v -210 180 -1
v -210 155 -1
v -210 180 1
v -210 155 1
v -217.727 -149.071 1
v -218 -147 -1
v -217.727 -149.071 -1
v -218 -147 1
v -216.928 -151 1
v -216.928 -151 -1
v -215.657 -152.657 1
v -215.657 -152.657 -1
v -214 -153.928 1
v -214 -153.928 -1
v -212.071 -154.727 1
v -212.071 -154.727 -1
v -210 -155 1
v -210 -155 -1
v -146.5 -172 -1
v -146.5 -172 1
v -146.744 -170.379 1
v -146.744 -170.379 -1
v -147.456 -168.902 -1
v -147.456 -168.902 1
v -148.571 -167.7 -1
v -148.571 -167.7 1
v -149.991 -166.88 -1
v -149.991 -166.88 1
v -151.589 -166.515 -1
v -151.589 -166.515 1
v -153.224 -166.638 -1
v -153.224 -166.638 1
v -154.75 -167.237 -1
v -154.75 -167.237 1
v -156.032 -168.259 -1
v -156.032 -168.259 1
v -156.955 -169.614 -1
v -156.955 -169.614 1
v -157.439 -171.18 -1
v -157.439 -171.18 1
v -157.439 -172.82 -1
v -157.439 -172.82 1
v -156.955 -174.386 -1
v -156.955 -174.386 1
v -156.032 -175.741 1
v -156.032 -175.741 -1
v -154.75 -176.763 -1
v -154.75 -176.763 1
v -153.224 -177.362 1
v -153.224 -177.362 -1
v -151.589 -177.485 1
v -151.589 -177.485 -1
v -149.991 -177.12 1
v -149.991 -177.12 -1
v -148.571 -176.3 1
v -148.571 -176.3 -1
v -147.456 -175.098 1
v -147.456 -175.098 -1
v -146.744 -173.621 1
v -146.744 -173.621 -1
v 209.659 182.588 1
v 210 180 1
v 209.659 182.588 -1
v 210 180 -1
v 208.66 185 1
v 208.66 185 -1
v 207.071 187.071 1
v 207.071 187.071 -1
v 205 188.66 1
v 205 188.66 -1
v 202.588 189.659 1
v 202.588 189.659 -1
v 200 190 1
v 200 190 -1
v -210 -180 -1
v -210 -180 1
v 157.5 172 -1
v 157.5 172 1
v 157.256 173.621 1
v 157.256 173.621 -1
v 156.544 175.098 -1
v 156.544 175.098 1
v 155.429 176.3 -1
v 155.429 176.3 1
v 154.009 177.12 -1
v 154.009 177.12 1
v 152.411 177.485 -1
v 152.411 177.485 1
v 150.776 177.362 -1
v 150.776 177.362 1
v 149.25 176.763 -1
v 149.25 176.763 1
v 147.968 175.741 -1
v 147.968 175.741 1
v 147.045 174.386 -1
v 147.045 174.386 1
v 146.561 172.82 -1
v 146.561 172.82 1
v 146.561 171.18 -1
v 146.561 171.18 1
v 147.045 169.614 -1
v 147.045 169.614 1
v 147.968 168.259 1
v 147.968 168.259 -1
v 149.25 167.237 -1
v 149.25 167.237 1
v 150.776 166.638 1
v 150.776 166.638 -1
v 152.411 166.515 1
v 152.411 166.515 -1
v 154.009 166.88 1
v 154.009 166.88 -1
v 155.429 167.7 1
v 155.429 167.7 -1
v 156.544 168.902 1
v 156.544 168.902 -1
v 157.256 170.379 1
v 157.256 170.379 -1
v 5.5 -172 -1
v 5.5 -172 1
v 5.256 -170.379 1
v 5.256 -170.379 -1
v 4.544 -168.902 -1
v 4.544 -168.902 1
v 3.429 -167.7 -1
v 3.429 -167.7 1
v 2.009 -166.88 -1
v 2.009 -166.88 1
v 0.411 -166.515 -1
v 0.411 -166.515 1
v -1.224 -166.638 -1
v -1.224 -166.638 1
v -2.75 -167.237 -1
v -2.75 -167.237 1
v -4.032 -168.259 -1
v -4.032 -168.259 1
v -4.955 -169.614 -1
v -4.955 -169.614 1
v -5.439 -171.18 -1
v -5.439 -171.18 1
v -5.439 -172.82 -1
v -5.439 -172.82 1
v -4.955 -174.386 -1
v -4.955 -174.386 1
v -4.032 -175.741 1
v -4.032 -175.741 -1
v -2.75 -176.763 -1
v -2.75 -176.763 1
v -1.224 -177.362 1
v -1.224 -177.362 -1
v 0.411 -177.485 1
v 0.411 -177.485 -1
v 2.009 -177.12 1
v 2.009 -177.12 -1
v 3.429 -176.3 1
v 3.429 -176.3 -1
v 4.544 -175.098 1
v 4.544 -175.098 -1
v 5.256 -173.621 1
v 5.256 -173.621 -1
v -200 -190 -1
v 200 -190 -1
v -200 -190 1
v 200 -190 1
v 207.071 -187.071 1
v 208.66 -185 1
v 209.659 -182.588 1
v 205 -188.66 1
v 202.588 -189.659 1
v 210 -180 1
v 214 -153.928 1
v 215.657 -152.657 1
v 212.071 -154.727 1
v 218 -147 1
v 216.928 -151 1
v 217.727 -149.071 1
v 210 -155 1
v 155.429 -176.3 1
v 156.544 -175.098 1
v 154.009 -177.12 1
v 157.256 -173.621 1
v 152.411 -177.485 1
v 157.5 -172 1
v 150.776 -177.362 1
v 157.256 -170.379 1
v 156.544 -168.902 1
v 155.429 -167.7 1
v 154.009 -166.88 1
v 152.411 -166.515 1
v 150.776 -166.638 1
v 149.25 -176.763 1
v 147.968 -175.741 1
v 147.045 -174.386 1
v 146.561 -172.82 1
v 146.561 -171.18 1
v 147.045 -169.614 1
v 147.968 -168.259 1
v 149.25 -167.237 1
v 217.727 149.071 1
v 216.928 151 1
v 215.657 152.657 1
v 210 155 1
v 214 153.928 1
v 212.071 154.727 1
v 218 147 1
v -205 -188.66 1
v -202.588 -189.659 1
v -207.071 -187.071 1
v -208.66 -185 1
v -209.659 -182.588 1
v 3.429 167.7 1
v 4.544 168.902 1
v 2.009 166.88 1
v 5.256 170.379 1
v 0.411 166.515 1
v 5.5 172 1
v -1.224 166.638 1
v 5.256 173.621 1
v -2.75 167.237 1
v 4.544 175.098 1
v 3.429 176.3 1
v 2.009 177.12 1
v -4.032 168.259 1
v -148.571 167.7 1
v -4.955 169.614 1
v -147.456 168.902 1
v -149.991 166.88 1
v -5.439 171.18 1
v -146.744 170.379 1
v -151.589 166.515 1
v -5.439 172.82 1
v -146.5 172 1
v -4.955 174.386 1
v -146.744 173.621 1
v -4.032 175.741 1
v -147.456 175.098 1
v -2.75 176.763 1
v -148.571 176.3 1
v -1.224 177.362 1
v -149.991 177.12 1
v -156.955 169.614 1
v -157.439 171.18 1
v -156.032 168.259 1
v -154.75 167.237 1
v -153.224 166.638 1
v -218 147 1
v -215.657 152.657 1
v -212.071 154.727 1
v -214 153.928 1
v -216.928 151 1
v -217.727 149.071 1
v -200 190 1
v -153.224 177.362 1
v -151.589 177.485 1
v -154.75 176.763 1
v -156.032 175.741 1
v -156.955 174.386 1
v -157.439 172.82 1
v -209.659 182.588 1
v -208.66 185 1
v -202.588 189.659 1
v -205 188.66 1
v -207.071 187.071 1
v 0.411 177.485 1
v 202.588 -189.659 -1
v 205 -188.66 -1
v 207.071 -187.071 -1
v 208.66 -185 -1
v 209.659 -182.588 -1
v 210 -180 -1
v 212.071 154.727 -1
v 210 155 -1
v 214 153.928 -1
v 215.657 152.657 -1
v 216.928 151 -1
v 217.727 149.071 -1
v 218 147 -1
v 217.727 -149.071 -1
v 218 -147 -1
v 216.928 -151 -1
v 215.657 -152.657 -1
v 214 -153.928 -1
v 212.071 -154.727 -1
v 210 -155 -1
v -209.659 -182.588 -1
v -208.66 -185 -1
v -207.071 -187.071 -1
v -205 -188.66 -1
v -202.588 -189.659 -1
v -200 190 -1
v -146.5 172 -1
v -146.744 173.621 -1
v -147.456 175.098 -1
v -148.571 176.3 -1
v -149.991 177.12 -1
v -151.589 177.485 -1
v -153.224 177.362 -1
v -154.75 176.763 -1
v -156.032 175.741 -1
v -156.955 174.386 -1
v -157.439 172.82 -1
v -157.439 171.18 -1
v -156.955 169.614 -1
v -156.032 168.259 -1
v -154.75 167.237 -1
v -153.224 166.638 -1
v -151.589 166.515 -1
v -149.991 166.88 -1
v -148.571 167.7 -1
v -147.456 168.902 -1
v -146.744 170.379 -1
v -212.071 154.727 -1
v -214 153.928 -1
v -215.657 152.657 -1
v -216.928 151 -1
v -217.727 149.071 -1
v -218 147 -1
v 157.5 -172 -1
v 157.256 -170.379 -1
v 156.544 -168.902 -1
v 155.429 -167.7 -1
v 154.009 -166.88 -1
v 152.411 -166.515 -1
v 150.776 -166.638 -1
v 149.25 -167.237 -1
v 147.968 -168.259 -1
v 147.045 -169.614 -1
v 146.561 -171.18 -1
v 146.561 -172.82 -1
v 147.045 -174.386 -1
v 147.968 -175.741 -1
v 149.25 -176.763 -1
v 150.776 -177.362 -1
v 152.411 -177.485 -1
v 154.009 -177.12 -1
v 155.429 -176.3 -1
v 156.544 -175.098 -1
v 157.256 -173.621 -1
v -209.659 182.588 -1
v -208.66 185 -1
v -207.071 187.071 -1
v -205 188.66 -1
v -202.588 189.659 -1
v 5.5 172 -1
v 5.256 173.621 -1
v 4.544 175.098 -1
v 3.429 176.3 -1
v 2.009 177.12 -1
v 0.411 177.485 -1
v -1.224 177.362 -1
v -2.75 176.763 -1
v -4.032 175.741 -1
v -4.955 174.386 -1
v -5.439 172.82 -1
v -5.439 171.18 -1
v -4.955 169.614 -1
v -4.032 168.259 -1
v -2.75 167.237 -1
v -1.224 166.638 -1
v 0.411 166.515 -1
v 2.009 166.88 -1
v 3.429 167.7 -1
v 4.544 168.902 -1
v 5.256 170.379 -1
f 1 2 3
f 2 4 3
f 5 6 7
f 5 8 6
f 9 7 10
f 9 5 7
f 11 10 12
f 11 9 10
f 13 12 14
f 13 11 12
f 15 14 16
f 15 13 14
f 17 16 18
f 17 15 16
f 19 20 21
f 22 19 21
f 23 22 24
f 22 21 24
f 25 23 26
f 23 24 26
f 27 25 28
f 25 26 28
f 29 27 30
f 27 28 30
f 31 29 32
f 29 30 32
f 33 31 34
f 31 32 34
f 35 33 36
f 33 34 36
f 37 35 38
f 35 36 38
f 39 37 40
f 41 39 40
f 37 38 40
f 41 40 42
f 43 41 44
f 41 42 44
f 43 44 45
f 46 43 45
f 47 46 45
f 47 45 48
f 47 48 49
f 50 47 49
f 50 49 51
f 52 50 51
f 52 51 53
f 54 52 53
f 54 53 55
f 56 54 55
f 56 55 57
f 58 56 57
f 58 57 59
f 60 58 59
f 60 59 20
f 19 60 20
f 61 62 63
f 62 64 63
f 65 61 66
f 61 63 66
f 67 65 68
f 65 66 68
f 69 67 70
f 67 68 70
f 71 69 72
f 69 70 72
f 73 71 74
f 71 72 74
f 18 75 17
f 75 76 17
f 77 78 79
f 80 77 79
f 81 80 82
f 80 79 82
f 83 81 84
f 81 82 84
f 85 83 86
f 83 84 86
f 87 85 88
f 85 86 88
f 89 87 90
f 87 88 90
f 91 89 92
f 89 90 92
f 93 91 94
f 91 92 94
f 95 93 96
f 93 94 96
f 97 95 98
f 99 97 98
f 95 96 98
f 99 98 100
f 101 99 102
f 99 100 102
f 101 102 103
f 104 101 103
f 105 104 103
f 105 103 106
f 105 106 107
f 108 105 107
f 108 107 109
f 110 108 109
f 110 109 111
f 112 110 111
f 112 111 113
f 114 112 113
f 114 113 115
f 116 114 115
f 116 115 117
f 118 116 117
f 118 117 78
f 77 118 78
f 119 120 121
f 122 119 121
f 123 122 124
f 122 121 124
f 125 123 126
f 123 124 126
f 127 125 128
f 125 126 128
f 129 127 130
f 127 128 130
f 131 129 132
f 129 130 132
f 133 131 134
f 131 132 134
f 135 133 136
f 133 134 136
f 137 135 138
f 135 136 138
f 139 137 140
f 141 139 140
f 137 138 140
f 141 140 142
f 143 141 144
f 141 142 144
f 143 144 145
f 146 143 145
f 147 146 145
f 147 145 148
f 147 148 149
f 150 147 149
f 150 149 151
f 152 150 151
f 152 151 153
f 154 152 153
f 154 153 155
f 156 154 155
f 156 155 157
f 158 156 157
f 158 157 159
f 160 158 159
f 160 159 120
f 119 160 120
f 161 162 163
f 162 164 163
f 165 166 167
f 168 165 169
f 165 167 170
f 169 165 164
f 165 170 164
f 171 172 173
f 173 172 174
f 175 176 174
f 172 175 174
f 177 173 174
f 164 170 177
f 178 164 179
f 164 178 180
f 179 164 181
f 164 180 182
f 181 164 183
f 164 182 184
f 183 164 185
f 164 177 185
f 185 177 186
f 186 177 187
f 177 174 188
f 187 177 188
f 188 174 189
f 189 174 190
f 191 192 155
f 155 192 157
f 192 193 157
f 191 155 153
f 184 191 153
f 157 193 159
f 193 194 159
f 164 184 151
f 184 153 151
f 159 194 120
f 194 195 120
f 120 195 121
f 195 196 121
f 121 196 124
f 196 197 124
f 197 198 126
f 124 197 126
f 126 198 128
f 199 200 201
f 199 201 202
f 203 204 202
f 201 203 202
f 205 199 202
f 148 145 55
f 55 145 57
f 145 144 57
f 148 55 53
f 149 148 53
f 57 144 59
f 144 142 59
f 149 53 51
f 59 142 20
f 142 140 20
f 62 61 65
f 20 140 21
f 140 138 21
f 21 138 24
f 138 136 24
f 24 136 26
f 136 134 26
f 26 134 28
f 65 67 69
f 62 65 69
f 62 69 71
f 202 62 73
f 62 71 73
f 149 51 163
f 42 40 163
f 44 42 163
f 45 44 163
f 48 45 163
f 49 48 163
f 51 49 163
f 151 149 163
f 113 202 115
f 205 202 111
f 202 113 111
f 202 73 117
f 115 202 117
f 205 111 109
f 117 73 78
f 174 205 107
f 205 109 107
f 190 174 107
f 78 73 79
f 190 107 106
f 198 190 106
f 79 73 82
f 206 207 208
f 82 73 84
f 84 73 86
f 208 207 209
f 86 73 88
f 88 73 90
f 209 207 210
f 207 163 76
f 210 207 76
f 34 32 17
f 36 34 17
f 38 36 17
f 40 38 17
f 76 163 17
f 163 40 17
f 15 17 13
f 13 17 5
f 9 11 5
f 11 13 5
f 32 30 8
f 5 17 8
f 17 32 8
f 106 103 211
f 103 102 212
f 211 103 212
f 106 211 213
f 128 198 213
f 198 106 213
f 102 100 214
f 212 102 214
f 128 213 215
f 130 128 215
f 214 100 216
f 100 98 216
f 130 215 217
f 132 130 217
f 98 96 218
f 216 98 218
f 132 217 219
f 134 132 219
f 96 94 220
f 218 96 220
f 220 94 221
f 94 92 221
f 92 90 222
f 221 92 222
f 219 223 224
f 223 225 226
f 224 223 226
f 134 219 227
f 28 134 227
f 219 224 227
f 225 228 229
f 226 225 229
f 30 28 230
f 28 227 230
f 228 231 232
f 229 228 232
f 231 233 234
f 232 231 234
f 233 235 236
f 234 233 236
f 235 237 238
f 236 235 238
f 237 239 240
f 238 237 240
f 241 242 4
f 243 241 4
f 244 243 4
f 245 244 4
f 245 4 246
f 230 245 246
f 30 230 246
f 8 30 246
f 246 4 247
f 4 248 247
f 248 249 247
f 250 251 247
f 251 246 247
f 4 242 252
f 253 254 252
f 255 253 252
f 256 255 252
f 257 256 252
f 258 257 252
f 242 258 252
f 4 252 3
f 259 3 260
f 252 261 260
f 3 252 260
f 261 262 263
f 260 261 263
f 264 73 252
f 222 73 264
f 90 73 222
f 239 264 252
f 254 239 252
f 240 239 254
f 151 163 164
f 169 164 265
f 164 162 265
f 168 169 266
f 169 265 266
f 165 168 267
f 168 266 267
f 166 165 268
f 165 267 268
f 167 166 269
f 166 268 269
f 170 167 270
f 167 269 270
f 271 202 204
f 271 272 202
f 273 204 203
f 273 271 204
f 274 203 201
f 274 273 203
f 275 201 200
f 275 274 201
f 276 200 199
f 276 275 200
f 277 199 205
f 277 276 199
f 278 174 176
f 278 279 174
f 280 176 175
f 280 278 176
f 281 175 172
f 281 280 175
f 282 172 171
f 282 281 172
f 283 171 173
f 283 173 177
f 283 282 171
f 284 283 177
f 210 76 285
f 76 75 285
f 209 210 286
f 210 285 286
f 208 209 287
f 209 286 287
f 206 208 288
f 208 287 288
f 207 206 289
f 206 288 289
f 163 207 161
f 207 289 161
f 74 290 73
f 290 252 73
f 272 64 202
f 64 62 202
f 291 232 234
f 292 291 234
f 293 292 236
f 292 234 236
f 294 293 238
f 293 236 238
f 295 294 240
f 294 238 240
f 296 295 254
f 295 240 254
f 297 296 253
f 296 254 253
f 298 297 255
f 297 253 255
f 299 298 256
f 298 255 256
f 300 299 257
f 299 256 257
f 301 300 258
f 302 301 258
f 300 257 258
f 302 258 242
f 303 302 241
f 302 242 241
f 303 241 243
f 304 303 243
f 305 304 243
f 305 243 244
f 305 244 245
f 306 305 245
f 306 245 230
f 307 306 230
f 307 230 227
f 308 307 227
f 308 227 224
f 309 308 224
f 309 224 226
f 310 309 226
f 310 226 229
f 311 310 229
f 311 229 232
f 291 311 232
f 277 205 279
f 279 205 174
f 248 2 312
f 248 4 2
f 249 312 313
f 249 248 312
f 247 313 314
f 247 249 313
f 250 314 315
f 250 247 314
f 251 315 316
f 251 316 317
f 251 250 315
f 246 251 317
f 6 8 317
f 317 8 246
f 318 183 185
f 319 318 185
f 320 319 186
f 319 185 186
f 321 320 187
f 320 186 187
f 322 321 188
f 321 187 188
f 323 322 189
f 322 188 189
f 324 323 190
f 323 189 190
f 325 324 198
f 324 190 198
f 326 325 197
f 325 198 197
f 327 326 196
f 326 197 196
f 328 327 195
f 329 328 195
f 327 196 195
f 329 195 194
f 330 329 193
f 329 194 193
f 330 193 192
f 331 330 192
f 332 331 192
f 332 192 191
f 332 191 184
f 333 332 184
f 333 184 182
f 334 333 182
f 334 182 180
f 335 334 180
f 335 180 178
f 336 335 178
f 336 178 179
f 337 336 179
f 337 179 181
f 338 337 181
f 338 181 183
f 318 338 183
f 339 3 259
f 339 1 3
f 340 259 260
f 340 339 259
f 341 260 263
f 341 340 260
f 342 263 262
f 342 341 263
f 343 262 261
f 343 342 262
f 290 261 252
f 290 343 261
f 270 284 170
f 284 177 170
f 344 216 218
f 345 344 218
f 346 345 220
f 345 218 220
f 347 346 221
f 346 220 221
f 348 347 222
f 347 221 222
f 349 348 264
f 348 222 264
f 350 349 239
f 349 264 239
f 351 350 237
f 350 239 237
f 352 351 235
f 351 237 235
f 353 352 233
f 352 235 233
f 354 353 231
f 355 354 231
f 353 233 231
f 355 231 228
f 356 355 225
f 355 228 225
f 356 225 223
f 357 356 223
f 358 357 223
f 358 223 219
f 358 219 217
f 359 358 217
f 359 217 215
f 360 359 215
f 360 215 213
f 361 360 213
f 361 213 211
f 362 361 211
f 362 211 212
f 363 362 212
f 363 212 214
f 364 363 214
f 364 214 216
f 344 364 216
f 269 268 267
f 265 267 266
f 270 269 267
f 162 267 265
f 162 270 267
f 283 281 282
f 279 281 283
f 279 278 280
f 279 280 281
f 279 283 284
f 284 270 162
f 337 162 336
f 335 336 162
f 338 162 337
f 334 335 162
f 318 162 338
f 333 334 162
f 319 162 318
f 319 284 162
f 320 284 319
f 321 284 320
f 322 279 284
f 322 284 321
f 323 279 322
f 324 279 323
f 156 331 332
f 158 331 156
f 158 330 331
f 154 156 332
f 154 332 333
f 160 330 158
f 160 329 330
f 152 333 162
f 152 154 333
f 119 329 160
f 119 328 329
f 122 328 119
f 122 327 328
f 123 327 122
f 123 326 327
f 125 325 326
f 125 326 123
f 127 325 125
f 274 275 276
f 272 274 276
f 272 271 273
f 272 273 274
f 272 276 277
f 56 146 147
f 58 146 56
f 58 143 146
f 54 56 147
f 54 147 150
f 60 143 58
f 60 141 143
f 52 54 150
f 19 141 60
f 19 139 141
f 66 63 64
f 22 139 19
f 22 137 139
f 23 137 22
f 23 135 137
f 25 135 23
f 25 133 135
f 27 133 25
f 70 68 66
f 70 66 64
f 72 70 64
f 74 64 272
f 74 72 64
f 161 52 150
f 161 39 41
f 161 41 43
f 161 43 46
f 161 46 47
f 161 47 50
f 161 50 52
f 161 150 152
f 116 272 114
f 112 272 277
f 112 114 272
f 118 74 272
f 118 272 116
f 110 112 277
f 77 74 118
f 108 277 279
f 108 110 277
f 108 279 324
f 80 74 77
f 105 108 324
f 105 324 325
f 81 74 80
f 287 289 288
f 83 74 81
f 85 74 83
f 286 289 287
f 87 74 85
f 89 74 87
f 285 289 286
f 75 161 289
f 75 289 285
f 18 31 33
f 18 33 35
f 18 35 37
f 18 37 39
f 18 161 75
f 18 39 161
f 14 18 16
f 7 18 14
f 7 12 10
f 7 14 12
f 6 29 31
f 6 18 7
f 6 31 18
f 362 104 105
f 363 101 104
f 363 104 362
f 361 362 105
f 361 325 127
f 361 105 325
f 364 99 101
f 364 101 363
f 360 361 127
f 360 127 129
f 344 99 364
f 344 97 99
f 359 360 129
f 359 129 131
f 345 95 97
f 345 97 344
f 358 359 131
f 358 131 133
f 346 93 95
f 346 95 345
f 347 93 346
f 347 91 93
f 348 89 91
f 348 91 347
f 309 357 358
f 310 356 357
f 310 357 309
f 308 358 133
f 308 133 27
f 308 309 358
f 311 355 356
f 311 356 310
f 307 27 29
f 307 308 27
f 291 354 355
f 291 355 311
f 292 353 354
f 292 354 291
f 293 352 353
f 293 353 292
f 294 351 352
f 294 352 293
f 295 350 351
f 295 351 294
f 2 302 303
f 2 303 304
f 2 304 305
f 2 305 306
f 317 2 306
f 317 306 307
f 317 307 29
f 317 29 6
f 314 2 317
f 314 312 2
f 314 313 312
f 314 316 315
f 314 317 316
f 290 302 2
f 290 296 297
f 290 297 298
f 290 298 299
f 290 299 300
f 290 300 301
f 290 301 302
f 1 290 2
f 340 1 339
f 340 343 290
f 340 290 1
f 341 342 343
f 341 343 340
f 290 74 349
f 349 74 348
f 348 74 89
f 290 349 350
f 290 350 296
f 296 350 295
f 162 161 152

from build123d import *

# Parameters (mm, degrees)
EXTRUDE_1_DEPTH     = 1
FILLET_1_R          = 10
FILLET_2_R          = 8
SKETCH_2_R          = 5.5
CUT_EXTRUDE_1_DEPTH = 10


with BuildPart() as part:
    # Эскиз1 → Бобышка-Вытянуть1 (new, symmetric)
    with BuildSketch(Plane.XY):
        Polygon((-210, 155), (-210, 190), (210, 190), (210, 155), (218, 155), (218, -155), (210, -155), (210, -190), (-210, -190), (-210, -155), (-218, -155), (-218, 155), align=None)
    extrude(amount=EXTRUDE_1_DEPTH, both=True)

    # Скругление1
    fillet_1_edges = [part.edges().sort_by_distance(p)[0] for p in [
        (210, -190, 0),
        (-210, -190, 0),
        (-210, 190, 0),
        (210, 190, 0),
    ]]
    fillet(fillet_1_edges, radius=FILLET_1_R)

    # Скругление2
    fillet_2_edges = [part.edges().sort_by_distance(p)[0] for p in [
        (-218, -155, 0),
        (-218, 155, 0),
        (218, 155, 0),
        (218, -155, 0),
    ]]
    fillet(fillet_2_edges, radius=FILLET_2_R - 0.0001)  # a hair under: the kernel refuses the full size

    # Эскиз2 → Вырез-Вытянуть1 (cut)
    with BuildSketch(Plane.XY.offset(1)):
        with Locations((0, -172)):
            Circle(SKETCH_2_R)
        with Locations((152, -172)):
            Circle(SKETCH_2_R)
        with Locations((-152, -172)):
            Circle(SKETCH_2_R)
        with Locations((-152, 172)):
            Circle(SKETCH_2_R)
        with Locations((152, 172)):
            Circle(SKETCH_2_R)
        with Locations((0, 172)):
            Circle(SKETCH_2_R)
    extrude(amount=-CUT_EXTRUDE_1_DEPTH, mode=Mode.SUBTRACT)


solid = part.part
